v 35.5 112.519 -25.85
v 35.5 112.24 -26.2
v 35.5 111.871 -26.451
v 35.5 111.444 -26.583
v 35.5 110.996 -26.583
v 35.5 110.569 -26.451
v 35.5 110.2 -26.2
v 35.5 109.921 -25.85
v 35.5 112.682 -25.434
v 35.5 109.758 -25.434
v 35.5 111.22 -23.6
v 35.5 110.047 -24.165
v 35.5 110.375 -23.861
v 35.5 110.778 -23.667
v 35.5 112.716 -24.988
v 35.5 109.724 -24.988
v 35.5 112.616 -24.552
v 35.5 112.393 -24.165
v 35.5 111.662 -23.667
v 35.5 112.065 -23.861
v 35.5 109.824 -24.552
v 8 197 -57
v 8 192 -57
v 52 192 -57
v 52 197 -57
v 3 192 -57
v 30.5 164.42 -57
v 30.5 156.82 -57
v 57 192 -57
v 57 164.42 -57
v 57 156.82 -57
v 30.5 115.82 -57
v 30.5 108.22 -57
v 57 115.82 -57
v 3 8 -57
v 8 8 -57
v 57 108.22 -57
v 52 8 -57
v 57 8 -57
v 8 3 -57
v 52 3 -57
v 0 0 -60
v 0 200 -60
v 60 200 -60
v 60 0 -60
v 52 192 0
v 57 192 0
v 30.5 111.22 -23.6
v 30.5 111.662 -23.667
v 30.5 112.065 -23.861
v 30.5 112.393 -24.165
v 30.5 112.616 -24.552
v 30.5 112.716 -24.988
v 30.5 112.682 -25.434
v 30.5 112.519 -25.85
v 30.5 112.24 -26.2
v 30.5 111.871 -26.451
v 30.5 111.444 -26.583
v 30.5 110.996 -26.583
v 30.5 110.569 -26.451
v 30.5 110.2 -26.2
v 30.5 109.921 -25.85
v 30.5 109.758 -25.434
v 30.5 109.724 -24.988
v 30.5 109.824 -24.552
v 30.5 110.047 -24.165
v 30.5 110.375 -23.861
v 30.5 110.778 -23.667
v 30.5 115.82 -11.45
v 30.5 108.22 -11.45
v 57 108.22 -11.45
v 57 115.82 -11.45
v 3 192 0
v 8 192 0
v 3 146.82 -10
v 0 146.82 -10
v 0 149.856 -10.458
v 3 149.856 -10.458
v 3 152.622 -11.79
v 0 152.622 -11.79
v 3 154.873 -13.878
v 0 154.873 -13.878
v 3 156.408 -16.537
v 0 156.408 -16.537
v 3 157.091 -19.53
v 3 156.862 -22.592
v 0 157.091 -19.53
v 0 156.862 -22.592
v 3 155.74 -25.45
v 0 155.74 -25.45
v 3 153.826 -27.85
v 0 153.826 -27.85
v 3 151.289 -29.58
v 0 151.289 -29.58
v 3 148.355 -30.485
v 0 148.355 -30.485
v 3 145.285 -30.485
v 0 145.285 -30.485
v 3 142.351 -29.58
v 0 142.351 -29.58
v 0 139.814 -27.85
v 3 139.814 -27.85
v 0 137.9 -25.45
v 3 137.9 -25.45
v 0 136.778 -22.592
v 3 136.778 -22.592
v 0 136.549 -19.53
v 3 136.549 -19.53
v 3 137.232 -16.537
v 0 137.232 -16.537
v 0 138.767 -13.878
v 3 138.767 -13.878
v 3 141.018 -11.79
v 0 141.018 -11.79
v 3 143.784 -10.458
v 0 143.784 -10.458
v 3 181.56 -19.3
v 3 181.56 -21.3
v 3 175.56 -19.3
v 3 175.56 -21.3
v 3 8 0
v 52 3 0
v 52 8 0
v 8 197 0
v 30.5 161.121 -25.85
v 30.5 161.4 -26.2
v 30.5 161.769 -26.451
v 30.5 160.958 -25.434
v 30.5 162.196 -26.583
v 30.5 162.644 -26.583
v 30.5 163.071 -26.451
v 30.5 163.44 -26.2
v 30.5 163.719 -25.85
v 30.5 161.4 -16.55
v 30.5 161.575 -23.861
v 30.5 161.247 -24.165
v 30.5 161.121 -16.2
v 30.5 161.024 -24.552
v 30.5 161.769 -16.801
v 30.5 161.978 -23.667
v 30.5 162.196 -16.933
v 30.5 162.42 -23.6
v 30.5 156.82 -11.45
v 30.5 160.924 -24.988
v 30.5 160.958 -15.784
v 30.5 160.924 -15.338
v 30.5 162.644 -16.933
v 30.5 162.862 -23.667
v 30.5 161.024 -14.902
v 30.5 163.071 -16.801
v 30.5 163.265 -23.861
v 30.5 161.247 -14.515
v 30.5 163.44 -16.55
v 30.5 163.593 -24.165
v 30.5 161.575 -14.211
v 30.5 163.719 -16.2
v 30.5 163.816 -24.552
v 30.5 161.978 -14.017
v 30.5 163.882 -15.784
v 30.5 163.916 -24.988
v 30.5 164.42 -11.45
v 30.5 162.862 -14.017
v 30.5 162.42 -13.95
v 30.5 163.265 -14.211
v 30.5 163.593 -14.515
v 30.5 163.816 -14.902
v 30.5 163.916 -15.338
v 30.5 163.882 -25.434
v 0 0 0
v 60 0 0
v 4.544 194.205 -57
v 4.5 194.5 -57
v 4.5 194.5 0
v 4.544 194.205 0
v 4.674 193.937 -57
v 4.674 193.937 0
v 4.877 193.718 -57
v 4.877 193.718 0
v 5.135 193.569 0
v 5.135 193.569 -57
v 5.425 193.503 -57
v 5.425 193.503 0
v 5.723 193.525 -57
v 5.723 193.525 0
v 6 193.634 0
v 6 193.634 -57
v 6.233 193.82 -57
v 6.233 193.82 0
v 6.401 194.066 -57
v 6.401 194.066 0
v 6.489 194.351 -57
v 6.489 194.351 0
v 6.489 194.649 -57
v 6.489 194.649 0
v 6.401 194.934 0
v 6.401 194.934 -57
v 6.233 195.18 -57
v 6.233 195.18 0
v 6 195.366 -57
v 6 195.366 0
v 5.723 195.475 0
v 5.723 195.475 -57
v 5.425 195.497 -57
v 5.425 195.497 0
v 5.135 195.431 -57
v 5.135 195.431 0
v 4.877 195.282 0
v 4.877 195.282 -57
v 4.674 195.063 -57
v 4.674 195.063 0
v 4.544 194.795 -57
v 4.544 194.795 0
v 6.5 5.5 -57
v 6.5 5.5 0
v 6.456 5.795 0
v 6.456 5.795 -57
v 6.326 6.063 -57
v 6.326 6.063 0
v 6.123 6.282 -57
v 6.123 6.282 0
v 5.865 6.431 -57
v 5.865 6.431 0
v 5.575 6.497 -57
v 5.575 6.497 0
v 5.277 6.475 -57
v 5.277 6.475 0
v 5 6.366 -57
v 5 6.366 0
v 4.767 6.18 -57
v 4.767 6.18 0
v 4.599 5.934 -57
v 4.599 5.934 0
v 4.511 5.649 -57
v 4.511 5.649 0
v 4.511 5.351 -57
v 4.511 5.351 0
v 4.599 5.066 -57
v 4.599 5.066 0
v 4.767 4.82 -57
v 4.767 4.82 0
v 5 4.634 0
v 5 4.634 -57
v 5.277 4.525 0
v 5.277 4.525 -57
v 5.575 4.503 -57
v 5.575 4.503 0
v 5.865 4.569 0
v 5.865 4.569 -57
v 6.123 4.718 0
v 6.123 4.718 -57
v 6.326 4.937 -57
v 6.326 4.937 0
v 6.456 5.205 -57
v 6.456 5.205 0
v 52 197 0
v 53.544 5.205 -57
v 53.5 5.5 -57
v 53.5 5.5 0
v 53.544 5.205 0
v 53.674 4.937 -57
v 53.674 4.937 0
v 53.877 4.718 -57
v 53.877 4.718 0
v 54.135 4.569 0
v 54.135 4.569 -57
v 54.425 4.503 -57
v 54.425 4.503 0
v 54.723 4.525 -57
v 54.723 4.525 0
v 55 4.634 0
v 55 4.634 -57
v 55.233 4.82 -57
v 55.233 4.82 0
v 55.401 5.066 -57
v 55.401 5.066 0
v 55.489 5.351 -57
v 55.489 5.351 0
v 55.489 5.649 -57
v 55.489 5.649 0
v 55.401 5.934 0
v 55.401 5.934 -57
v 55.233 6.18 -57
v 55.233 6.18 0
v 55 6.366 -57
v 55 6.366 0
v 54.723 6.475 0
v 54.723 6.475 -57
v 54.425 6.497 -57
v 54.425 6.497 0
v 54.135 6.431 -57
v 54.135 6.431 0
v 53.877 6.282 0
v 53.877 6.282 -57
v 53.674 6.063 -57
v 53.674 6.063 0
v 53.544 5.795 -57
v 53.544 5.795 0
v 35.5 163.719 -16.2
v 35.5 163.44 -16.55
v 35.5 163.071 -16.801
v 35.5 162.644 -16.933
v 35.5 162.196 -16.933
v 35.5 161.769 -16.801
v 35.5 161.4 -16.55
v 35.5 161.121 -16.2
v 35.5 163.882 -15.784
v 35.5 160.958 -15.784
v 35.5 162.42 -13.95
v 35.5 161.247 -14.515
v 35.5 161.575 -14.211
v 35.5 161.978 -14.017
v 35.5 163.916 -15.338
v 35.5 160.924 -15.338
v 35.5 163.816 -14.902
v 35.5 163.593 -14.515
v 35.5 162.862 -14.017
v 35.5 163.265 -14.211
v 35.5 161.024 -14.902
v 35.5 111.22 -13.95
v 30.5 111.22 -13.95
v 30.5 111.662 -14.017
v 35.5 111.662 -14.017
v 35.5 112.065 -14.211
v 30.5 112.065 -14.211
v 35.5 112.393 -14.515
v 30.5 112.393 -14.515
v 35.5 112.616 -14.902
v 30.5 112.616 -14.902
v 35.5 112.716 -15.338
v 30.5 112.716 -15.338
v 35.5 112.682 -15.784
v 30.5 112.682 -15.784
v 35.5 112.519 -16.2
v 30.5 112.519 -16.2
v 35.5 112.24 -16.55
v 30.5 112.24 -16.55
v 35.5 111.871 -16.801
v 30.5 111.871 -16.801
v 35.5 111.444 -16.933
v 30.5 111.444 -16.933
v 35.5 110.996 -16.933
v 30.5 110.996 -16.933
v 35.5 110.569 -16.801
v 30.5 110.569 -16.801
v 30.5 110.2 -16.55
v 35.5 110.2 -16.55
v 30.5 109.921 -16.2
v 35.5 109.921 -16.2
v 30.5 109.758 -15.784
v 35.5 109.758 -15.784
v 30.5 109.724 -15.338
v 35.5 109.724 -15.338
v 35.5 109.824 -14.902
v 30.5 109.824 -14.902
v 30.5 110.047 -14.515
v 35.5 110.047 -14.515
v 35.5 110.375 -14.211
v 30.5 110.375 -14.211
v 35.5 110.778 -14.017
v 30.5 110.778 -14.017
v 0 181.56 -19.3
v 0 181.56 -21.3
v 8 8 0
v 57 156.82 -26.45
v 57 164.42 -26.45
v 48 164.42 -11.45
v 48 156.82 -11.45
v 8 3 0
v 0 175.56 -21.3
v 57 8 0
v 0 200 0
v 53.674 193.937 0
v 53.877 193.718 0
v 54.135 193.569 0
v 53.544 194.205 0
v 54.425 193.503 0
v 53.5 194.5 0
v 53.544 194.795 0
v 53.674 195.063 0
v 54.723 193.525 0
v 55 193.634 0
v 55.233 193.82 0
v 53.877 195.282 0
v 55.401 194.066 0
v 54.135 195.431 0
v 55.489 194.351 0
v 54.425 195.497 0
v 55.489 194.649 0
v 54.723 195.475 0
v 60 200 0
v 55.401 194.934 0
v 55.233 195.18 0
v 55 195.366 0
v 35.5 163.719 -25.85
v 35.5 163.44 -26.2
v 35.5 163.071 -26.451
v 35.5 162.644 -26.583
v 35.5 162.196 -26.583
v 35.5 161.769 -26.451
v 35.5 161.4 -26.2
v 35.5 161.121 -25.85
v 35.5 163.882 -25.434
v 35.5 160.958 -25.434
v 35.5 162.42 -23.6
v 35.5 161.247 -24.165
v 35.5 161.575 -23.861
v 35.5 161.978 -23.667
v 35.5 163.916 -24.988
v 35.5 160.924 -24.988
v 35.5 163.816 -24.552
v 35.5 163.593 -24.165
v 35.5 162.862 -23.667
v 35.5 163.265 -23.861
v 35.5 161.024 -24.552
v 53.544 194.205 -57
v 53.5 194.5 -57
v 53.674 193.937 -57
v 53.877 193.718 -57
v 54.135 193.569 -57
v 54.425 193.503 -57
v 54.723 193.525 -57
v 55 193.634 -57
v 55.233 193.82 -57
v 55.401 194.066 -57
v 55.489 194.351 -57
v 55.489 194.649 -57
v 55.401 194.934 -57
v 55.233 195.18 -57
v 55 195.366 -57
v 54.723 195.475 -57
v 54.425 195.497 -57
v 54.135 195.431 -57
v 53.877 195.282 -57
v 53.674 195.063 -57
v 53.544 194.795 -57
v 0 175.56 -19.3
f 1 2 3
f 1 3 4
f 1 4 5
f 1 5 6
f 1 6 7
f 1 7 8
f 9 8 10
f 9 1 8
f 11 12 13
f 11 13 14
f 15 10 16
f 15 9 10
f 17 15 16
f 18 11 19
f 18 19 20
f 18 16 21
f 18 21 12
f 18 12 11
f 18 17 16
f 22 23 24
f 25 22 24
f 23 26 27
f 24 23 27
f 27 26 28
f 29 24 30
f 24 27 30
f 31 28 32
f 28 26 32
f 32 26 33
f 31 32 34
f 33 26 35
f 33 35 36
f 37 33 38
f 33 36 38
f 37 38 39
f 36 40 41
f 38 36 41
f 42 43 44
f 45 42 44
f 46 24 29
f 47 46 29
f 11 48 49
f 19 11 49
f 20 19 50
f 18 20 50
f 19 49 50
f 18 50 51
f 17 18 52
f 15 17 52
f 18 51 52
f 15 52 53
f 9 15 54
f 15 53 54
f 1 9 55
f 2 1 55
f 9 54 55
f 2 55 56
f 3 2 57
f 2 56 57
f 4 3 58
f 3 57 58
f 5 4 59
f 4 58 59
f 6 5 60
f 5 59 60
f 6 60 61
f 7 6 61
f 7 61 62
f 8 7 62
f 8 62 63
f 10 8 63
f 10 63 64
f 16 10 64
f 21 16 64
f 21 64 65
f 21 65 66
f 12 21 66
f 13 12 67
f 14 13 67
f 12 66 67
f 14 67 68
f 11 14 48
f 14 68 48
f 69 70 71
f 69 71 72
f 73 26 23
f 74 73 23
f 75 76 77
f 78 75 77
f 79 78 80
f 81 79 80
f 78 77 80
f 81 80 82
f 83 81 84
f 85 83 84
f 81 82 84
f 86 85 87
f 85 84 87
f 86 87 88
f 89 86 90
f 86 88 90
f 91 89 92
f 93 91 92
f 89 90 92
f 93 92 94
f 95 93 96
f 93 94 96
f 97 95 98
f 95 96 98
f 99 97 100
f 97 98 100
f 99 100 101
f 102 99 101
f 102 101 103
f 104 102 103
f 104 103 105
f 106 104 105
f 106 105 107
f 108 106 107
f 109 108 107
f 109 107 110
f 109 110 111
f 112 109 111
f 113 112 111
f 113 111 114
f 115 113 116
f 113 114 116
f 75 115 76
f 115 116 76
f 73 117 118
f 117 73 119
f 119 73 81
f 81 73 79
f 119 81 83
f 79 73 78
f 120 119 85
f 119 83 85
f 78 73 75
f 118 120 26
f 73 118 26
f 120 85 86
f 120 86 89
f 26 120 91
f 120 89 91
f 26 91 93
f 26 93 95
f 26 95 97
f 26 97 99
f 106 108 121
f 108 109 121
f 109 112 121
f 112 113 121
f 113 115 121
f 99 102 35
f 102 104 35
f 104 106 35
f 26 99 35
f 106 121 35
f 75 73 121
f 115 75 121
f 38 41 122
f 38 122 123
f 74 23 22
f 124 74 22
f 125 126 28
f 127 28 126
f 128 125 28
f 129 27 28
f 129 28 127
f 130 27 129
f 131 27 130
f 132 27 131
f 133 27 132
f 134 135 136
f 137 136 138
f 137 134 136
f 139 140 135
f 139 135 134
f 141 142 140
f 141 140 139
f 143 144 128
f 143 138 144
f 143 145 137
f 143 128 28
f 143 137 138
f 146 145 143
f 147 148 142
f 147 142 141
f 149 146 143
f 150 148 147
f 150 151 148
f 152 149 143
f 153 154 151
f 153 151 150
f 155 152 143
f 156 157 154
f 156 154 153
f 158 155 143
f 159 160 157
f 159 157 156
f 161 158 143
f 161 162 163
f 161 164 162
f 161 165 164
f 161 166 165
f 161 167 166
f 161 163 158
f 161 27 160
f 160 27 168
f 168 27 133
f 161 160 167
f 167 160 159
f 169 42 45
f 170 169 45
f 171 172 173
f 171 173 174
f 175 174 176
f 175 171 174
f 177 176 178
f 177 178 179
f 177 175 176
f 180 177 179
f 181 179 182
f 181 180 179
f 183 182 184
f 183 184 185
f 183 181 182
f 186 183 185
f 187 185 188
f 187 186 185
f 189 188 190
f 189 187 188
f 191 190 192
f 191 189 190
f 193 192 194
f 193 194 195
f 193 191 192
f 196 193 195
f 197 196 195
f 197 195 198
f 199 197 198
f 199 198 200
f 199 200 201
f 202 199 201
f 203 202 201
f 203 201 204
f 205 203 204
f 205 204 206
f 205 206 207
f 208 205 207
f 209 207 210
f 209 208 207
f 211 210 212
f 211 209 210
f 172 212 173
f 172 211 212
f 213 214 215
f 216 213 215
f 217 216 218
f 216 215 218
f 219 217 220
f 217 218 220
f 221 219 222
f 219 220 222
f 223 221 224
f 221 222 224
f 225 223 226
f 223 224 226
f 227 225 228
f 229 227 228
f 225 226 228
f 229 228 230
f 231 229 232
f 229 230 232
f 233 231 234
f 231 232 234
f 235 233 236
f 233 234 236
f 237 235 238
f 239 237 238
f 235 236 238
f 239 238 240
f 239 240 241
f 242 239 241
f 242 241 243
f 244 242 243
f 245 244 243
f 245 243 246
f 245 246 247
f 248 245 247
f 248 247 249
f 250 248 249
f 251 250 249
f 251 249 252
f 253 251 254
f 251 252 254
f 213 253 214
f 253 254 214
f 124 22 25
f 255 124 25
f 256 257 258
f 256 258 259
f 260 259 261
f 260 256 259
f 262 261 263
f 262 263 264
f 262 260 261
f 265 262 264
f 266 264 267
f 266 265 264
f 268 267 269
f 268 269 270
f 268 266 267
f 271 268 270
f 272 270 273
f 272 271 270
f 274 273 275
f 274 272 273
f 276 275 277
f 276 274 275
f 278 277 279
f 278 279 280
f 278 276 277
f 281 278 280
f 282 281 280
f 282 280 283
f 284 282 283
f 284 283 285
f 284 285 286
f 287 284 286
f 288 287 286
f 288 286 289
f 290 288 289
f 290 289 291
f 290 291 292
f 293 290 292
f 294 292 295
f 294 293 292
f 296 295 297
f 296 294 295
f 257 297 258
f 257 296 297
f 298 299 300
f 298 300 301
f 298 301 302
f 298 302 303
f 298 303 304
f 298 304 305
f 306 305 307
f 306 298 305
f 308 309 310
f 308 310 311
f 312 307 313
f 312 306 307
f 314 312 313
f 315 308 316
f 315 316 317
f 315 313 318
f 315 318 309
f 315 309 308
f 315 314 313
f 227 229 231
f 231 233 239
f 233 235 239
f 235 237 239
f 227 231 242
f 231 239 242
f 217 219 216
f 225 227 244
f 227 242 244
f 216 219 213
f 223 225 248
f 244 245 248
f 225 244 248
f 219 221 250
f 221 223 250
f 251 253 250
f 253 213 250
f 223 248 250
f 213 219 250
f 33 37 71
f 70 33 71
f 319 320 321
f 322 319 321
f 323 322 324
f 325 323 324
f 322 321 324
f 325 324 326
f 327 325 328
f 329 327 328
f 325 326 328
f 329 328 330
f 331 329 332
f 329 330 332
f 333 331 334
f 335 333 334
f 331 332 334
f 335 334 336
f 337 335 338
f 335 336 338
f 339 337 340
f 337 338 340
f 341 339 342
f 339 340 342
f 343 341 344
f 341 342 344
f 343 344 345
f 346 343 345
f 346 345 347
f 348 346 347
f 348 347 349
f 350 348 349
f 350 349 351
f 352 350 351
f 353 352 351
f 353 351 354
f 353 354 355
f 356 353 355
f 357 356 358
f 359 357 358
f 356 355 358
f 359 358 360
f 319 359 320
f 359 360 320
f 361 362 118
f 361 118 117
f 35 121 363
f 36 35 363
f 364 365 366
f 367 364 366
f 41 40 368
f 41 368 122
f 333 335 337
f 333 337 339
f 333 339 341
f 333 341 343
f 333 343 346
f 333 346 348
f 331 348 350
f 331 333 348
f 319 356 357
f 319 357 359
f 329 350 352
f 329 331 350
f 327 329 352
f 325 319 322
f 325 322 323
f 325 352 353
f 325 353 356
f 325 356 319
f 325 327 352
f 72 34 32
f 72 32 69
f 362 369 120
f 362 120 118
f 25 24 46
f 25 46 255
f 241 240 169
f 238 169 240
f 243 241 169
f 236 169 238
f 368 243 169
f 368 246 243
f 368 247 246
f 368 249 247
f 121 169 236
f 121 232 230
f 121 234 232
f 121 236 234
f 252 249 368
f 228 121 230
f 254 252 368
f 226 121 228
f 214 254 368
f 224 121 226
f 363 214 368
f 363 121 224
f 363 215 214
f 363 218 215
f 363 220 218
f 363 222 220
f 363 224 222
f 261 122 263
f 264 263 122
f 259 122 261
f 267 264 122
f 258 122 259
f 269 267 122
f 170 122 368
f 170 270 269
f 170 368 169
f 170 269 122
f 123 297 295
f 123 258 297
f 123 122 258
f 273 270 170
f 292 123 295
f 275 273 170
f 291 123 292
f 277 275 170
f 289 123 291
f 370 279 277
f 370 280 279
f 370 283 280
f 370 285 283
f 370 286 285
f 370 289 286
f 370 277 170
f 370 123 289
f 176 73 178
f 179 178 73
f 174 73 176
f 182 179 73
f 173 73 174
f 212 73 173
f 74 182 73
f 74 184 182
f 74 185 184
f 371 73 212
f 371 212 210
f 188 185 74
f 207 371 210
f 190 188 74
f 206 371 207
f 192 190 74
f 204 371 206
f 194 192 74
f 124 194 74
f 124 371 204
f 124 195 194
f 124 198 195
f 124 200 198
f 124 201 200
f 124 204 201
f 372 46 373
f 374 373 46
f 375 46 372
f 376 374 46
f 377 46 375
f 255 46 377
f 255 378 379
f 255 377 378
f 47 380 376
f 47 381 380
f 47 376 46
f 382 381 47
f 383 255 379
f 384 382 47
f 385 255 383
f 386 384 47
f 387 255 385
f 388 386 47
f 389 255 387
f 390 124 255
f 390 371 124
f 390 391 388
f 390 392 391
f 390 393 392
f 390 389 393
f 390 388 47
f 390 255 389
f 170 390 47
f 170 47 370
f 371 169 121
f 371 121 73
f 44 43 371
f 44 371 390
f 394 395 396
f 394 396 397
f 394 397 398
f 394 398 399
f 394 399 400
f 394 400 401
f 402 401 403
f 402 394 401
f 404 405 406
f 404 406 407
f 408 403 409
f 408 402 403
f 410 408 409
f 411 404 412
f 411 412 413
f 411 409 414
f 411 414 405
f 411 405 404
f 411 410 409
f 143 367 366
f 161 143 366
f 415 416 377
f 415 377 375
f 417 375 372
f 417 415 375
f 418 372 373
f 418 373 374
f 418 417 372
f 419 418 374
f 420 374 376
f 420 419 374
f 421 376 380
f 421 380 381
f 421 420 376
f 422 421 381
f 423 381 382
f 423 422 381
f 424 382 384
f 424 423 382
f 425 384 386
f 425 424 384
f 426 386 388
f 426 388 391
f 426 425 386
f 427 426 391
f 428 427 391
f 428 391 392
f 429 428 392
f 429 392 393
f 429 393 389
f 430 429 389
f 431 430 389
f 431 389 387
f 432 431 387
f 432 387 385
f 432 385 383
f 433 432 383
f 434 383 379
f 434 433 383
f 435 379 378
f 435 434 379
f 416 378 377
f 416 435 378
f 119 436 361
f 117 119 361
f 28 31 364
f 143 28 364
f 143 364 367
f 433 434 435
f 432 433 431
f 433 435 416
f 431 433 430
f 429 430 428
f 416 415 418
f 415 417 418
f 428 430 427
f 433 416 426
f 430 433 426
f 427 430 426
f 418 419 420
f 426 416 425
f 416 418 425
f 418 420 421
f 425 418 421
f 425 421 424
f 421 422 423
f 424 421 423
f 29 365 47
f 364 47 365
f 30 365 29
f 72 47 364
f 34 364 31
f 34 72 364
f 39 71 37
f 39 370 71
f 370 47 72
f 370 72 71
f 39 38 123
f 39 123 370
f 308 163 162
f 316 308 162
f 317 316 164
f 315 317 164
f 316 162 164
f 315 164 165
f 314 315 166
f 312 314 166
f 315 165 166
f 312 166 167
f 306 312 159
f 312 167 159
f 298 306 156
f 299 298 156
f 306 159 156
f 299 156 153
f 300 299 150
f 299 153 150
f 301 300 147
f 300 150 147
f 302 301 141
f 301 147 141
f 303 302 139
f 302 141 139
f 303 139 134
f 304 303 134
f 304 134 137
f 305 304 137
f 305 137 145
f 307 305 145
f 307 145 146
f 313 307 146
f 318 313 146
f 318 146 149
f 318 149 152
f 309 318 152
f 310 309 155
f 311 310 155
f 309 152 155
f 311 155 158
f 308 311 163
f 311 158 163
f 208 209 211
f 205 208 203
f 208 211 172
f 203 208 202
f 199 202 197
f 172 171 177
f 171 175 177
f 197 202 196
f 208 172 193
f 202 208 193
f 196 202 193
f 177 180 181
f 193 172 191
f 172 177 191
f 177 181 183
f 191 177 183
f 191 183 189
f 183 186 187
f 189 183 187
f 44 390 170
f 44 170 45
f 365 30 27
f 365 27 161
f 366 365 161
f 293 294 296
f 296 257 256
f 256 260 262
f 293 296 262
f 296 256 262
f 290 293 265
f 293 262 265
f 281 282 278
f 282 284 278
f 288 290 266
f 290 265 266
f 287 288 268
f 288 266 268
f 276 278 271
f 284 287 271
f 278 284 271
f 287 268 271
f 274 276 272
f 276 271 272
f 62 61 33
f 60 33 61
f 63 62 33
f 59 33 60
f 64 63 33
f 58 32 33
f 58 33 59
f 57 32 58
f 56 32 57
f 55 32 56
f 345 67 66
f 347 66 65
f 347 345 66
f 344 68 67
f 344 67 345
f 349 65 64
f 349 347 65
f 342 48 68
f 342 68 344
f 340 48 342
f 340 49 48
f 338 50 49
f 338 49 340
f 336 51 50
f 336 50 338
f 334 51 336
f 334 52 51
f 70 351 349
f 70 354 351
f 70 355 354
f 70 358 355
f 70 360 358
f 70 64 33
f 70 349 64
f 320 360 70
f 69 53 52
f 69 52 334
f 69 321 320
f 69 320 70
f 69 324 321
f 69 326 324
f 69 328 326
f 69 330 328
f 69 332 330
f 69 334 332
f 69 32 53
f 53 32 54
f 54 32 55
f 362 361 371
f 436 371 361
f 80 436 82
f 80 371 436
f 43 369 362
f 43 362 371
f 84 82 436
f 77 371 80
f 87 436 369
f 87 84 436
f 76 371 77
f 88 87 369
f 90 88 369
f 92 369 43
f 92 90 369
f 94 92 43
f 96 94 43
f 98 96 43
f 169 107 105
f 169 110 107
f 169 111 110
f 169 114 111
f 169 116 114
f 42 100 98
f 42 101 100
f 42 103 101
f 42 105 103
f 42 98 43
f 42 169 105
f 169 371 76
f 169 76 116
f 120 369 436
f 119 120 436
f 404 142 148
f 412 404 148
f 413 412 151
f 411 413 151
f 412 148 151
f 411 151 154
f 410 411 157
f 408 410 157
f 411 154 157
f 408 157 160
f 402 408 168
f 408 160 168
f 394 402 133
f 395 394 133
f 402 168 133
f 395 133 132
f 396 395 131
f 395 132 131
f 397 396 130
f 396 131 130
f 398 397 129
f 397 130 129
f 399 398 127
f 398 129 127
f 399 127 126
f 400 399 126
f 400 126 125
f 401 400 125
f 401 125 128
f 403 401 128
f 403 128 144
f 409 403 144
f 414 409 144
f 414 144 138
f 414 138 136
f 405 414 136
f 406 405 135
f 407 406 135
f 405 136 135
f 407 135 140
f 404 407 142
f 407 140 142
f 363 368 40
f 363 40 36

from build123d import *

# Parameters (mm, degrees)
SZKIC1_W                    = 60
SZKIC1_H                    = 60
DODANIE_WYCI_GNI_CIE1_DEPTH = 200
SKORUPA1_T                  = -3
SZKIC2_W                    = 5
SZKIC2_H                    = 5
SZKIC2_R                    = 1
DODANIE_WYCI_GNI_CIE5_DEPTH = 57
SZKIC3_W                    = 5
SZKIC3_H                    = 5
SZKIC3_R                    = 1
DODANIE_WYCI_GNI_CIE6_DEPTH = 57
SZKIC4_W                    = 5
SZKIC4_H                    = 5
SZKIC4_R                    = 1
DODANIE_WYCI_GNI_CIE7_DEPTH = 57
SZKIC5_W                    = 5
SZKIC5_H                    = 5
SZKIC5_R                    = 1
DODANIE_WYCI_GNI_CIE8_DEPTH = 57
SZKIC10_R                   = 10.3
WYTNIJ_WYCI_GNI_CIE3_DEPTH  = 3
SZKIC12_W                   = 45.55
SZKIC12_H                   = 7.6
DODANIE_WYCI_GNI_CIE9_DEPTH = 26.5
SZKIC13_R                   = 1.5
WYTNIJ_WYCI_GNI_CIE4_DEPTH  = 5
SZKIC15_R                   = 1.5
WYTNIJ_WYCI_GNI_CIE5_DEPTH  = 5
WYTNIJ_WYCI_GNI_CIE6_DEPTH  = 10
SZKIC17_W                   = 2
SZKIC17_H                   = 6
WYTNIJ_WYCI_GNI_CIE7_DEPTH  = 10


with BuildPart() as part:
    # Szkic1 → Dodanie-wyciągnięcie1 (new body)
    with BuildSketch(Plane(origin=(0, 0, 0), x_dir=(1, 0, 0), z_dir=(0, 1, 0))):
        with Locations((30, 30)):
            Rectangle(SZKIC1_W, SZKIC1_H)
    extrude(amount=DODANIE_WYCI_GNI_CIE1_DEPTH)

    # Skorupa1
    skorupa1_openings = [part.faces().sort_by_distance(p)[0] for p in [
        (30, 100, 0),
    ]]
    offset(amount=SKORUPA1_T, openings=skorupa1_openings, kind=Kind.INTERSECTION)

    # Szkic2 → Dodanie-wyciągnięcie5 (add)
    with BuildSketch(Plane.XY.offset(-57)):
        with Locations((5.5, 194.5)):
            Rectangle(SZKIC2_W, SZKIC2_H)
        with Locations(Location((5.5, 194.5, 0), (0, 0, 180))):
            Circle(SZKIC2_R, mode=Mode.SUBTRACT)
    extrude(amount=DODANIE_WYCI_GNI_CIE5_DEPTH)

    # Szkic3 → Dodanie-wyciągnięcie6 (add)
    with BuildSketch(Plane.XY.offset(-57)):
        with Locations((54.5, 194.5)):
            Rectangle(SZKIC3_W, SZKIC3_H)
        with Locations(Location((54.5, 194.5, 0), (0, 0, 180))):
            Circle(SZKIC3_R, mode=Mode.SUBTRACT)
    extrude(amount=DODANIE_WYCI_GNI_CIE6_DEPTH)

    # Szkic4 → Dodanie-wyciągnięcie7 (add)
    with BuildSketch(Plane.XY):
        with Locations((5.5, 5.5)):
            Rectangle(SZKIC4_W, SZKIC4_H)
        with Locations((5.5, 5.5)):
            Circle(SZKIC4_R, mode=Mode.SUBTRACT)
    extrude(amount=-DODANIE_WYCI_GNI_CIE7_DEPTH)

    # Szkic5 → Dodanie-wyciągnięcie8 (add)
    with BuildSketch(Plane.XY.offset(-57)):
        with Locations((54.5, 5.5)):
            Rectangle(SZKIC5_W, SZKIC5_H)
        with Locations(Location((54.5, 5.5, 0), (0, 0, 180))):
            Circle(SZKIC5_R, mode=Mode.SUBTRACT)
    extrude(amount=DODANIE_WYCI_GNI_CIE8_DEPTH)

    # Szkic10 → Wytnij-wyciągnięcie3 (cut)
    with BuildSketch(Plane.ZY):
        with Locations((-20.3, 146.82)):
            Circle(SZKIC10_R)
    extrude(amount=-WYTNIJ_WYCI_GNI_CIE3_DEPTH, mode=Mode.SUBTRACT)

    # Szkic12 → Dodanie-wyciągnięcie9 (add)
    with BuildSketch(Plane.ZY.offset(-57)):
        with Locations((-34.225, 160.62)):
            Rectangle(SZKIC12_W, SZKIC12_H)
        with Locations((-34.225, 112.02)):
            Rectangle(SZKIC12_W, SZKIC12_H)
    extrude(amount=DODANIE_WYCI_GNI_CIE9_DEPTH)

    # Szkic13 → Wytnij-wyciągnięcie4 (cut)
    with BuildSketch(Plane.ZY.offset(-30.5)):
        with Locations((-15.45, 162.42)):
            Circle(SZKIC13_R)
        with Locations((-25.1, 162.42)):
            Circle(SZKIC13_R)
    extrude(amount=-WYTNIJ_WYCI_GNI_CIE4_DEPTH, mode=Mode.SUBTRACT)

    # Szkic15 → Wytnij-wyciągnięcie5 (cut)
    with BuildSketch(Plane.ZY.offset(-30.5)):
        with Locations((-15.45, 111.22)):
            Circle(SZKIC15_R)
        with Locations((-25.1, 111.22)):
            Circle(SZKIC15_R)
    extrude(amount=-WYTNIJ_WYCI_GNI_CIE5_DEPTH, mode=Mode.SUBTRACT)

    # Szkic16 → Wytnij-wyciągnięcie6 (cut)
    with BuildSketch(Plane(origin=(0, 164.42, 0), x_dir=(1, 0, 0), z_dir=(0, 1, 0))):
        Polygon((57, 11.45), (57, 26.45), (48, 11.45), align=None)
    extrude(amount=-WYTNIJ_WYCI_GNI_CIE6_DEPTH, mode=Mode.SUBTRACT)

    # Szkic17 → Wytnij-wyciągnięcie7 (cut)
    with BuildSketch(Plane.ZY):
        with Locations((-20.3, 178.56)):
            Rectangle(SZKIC17_W, SZKIC17_H)
    extrude(amount=-WYTNIJ_WYCI_GNI_CIE7_DEPTH, mode=Mode.SUBTRACT)


solid = part.part
